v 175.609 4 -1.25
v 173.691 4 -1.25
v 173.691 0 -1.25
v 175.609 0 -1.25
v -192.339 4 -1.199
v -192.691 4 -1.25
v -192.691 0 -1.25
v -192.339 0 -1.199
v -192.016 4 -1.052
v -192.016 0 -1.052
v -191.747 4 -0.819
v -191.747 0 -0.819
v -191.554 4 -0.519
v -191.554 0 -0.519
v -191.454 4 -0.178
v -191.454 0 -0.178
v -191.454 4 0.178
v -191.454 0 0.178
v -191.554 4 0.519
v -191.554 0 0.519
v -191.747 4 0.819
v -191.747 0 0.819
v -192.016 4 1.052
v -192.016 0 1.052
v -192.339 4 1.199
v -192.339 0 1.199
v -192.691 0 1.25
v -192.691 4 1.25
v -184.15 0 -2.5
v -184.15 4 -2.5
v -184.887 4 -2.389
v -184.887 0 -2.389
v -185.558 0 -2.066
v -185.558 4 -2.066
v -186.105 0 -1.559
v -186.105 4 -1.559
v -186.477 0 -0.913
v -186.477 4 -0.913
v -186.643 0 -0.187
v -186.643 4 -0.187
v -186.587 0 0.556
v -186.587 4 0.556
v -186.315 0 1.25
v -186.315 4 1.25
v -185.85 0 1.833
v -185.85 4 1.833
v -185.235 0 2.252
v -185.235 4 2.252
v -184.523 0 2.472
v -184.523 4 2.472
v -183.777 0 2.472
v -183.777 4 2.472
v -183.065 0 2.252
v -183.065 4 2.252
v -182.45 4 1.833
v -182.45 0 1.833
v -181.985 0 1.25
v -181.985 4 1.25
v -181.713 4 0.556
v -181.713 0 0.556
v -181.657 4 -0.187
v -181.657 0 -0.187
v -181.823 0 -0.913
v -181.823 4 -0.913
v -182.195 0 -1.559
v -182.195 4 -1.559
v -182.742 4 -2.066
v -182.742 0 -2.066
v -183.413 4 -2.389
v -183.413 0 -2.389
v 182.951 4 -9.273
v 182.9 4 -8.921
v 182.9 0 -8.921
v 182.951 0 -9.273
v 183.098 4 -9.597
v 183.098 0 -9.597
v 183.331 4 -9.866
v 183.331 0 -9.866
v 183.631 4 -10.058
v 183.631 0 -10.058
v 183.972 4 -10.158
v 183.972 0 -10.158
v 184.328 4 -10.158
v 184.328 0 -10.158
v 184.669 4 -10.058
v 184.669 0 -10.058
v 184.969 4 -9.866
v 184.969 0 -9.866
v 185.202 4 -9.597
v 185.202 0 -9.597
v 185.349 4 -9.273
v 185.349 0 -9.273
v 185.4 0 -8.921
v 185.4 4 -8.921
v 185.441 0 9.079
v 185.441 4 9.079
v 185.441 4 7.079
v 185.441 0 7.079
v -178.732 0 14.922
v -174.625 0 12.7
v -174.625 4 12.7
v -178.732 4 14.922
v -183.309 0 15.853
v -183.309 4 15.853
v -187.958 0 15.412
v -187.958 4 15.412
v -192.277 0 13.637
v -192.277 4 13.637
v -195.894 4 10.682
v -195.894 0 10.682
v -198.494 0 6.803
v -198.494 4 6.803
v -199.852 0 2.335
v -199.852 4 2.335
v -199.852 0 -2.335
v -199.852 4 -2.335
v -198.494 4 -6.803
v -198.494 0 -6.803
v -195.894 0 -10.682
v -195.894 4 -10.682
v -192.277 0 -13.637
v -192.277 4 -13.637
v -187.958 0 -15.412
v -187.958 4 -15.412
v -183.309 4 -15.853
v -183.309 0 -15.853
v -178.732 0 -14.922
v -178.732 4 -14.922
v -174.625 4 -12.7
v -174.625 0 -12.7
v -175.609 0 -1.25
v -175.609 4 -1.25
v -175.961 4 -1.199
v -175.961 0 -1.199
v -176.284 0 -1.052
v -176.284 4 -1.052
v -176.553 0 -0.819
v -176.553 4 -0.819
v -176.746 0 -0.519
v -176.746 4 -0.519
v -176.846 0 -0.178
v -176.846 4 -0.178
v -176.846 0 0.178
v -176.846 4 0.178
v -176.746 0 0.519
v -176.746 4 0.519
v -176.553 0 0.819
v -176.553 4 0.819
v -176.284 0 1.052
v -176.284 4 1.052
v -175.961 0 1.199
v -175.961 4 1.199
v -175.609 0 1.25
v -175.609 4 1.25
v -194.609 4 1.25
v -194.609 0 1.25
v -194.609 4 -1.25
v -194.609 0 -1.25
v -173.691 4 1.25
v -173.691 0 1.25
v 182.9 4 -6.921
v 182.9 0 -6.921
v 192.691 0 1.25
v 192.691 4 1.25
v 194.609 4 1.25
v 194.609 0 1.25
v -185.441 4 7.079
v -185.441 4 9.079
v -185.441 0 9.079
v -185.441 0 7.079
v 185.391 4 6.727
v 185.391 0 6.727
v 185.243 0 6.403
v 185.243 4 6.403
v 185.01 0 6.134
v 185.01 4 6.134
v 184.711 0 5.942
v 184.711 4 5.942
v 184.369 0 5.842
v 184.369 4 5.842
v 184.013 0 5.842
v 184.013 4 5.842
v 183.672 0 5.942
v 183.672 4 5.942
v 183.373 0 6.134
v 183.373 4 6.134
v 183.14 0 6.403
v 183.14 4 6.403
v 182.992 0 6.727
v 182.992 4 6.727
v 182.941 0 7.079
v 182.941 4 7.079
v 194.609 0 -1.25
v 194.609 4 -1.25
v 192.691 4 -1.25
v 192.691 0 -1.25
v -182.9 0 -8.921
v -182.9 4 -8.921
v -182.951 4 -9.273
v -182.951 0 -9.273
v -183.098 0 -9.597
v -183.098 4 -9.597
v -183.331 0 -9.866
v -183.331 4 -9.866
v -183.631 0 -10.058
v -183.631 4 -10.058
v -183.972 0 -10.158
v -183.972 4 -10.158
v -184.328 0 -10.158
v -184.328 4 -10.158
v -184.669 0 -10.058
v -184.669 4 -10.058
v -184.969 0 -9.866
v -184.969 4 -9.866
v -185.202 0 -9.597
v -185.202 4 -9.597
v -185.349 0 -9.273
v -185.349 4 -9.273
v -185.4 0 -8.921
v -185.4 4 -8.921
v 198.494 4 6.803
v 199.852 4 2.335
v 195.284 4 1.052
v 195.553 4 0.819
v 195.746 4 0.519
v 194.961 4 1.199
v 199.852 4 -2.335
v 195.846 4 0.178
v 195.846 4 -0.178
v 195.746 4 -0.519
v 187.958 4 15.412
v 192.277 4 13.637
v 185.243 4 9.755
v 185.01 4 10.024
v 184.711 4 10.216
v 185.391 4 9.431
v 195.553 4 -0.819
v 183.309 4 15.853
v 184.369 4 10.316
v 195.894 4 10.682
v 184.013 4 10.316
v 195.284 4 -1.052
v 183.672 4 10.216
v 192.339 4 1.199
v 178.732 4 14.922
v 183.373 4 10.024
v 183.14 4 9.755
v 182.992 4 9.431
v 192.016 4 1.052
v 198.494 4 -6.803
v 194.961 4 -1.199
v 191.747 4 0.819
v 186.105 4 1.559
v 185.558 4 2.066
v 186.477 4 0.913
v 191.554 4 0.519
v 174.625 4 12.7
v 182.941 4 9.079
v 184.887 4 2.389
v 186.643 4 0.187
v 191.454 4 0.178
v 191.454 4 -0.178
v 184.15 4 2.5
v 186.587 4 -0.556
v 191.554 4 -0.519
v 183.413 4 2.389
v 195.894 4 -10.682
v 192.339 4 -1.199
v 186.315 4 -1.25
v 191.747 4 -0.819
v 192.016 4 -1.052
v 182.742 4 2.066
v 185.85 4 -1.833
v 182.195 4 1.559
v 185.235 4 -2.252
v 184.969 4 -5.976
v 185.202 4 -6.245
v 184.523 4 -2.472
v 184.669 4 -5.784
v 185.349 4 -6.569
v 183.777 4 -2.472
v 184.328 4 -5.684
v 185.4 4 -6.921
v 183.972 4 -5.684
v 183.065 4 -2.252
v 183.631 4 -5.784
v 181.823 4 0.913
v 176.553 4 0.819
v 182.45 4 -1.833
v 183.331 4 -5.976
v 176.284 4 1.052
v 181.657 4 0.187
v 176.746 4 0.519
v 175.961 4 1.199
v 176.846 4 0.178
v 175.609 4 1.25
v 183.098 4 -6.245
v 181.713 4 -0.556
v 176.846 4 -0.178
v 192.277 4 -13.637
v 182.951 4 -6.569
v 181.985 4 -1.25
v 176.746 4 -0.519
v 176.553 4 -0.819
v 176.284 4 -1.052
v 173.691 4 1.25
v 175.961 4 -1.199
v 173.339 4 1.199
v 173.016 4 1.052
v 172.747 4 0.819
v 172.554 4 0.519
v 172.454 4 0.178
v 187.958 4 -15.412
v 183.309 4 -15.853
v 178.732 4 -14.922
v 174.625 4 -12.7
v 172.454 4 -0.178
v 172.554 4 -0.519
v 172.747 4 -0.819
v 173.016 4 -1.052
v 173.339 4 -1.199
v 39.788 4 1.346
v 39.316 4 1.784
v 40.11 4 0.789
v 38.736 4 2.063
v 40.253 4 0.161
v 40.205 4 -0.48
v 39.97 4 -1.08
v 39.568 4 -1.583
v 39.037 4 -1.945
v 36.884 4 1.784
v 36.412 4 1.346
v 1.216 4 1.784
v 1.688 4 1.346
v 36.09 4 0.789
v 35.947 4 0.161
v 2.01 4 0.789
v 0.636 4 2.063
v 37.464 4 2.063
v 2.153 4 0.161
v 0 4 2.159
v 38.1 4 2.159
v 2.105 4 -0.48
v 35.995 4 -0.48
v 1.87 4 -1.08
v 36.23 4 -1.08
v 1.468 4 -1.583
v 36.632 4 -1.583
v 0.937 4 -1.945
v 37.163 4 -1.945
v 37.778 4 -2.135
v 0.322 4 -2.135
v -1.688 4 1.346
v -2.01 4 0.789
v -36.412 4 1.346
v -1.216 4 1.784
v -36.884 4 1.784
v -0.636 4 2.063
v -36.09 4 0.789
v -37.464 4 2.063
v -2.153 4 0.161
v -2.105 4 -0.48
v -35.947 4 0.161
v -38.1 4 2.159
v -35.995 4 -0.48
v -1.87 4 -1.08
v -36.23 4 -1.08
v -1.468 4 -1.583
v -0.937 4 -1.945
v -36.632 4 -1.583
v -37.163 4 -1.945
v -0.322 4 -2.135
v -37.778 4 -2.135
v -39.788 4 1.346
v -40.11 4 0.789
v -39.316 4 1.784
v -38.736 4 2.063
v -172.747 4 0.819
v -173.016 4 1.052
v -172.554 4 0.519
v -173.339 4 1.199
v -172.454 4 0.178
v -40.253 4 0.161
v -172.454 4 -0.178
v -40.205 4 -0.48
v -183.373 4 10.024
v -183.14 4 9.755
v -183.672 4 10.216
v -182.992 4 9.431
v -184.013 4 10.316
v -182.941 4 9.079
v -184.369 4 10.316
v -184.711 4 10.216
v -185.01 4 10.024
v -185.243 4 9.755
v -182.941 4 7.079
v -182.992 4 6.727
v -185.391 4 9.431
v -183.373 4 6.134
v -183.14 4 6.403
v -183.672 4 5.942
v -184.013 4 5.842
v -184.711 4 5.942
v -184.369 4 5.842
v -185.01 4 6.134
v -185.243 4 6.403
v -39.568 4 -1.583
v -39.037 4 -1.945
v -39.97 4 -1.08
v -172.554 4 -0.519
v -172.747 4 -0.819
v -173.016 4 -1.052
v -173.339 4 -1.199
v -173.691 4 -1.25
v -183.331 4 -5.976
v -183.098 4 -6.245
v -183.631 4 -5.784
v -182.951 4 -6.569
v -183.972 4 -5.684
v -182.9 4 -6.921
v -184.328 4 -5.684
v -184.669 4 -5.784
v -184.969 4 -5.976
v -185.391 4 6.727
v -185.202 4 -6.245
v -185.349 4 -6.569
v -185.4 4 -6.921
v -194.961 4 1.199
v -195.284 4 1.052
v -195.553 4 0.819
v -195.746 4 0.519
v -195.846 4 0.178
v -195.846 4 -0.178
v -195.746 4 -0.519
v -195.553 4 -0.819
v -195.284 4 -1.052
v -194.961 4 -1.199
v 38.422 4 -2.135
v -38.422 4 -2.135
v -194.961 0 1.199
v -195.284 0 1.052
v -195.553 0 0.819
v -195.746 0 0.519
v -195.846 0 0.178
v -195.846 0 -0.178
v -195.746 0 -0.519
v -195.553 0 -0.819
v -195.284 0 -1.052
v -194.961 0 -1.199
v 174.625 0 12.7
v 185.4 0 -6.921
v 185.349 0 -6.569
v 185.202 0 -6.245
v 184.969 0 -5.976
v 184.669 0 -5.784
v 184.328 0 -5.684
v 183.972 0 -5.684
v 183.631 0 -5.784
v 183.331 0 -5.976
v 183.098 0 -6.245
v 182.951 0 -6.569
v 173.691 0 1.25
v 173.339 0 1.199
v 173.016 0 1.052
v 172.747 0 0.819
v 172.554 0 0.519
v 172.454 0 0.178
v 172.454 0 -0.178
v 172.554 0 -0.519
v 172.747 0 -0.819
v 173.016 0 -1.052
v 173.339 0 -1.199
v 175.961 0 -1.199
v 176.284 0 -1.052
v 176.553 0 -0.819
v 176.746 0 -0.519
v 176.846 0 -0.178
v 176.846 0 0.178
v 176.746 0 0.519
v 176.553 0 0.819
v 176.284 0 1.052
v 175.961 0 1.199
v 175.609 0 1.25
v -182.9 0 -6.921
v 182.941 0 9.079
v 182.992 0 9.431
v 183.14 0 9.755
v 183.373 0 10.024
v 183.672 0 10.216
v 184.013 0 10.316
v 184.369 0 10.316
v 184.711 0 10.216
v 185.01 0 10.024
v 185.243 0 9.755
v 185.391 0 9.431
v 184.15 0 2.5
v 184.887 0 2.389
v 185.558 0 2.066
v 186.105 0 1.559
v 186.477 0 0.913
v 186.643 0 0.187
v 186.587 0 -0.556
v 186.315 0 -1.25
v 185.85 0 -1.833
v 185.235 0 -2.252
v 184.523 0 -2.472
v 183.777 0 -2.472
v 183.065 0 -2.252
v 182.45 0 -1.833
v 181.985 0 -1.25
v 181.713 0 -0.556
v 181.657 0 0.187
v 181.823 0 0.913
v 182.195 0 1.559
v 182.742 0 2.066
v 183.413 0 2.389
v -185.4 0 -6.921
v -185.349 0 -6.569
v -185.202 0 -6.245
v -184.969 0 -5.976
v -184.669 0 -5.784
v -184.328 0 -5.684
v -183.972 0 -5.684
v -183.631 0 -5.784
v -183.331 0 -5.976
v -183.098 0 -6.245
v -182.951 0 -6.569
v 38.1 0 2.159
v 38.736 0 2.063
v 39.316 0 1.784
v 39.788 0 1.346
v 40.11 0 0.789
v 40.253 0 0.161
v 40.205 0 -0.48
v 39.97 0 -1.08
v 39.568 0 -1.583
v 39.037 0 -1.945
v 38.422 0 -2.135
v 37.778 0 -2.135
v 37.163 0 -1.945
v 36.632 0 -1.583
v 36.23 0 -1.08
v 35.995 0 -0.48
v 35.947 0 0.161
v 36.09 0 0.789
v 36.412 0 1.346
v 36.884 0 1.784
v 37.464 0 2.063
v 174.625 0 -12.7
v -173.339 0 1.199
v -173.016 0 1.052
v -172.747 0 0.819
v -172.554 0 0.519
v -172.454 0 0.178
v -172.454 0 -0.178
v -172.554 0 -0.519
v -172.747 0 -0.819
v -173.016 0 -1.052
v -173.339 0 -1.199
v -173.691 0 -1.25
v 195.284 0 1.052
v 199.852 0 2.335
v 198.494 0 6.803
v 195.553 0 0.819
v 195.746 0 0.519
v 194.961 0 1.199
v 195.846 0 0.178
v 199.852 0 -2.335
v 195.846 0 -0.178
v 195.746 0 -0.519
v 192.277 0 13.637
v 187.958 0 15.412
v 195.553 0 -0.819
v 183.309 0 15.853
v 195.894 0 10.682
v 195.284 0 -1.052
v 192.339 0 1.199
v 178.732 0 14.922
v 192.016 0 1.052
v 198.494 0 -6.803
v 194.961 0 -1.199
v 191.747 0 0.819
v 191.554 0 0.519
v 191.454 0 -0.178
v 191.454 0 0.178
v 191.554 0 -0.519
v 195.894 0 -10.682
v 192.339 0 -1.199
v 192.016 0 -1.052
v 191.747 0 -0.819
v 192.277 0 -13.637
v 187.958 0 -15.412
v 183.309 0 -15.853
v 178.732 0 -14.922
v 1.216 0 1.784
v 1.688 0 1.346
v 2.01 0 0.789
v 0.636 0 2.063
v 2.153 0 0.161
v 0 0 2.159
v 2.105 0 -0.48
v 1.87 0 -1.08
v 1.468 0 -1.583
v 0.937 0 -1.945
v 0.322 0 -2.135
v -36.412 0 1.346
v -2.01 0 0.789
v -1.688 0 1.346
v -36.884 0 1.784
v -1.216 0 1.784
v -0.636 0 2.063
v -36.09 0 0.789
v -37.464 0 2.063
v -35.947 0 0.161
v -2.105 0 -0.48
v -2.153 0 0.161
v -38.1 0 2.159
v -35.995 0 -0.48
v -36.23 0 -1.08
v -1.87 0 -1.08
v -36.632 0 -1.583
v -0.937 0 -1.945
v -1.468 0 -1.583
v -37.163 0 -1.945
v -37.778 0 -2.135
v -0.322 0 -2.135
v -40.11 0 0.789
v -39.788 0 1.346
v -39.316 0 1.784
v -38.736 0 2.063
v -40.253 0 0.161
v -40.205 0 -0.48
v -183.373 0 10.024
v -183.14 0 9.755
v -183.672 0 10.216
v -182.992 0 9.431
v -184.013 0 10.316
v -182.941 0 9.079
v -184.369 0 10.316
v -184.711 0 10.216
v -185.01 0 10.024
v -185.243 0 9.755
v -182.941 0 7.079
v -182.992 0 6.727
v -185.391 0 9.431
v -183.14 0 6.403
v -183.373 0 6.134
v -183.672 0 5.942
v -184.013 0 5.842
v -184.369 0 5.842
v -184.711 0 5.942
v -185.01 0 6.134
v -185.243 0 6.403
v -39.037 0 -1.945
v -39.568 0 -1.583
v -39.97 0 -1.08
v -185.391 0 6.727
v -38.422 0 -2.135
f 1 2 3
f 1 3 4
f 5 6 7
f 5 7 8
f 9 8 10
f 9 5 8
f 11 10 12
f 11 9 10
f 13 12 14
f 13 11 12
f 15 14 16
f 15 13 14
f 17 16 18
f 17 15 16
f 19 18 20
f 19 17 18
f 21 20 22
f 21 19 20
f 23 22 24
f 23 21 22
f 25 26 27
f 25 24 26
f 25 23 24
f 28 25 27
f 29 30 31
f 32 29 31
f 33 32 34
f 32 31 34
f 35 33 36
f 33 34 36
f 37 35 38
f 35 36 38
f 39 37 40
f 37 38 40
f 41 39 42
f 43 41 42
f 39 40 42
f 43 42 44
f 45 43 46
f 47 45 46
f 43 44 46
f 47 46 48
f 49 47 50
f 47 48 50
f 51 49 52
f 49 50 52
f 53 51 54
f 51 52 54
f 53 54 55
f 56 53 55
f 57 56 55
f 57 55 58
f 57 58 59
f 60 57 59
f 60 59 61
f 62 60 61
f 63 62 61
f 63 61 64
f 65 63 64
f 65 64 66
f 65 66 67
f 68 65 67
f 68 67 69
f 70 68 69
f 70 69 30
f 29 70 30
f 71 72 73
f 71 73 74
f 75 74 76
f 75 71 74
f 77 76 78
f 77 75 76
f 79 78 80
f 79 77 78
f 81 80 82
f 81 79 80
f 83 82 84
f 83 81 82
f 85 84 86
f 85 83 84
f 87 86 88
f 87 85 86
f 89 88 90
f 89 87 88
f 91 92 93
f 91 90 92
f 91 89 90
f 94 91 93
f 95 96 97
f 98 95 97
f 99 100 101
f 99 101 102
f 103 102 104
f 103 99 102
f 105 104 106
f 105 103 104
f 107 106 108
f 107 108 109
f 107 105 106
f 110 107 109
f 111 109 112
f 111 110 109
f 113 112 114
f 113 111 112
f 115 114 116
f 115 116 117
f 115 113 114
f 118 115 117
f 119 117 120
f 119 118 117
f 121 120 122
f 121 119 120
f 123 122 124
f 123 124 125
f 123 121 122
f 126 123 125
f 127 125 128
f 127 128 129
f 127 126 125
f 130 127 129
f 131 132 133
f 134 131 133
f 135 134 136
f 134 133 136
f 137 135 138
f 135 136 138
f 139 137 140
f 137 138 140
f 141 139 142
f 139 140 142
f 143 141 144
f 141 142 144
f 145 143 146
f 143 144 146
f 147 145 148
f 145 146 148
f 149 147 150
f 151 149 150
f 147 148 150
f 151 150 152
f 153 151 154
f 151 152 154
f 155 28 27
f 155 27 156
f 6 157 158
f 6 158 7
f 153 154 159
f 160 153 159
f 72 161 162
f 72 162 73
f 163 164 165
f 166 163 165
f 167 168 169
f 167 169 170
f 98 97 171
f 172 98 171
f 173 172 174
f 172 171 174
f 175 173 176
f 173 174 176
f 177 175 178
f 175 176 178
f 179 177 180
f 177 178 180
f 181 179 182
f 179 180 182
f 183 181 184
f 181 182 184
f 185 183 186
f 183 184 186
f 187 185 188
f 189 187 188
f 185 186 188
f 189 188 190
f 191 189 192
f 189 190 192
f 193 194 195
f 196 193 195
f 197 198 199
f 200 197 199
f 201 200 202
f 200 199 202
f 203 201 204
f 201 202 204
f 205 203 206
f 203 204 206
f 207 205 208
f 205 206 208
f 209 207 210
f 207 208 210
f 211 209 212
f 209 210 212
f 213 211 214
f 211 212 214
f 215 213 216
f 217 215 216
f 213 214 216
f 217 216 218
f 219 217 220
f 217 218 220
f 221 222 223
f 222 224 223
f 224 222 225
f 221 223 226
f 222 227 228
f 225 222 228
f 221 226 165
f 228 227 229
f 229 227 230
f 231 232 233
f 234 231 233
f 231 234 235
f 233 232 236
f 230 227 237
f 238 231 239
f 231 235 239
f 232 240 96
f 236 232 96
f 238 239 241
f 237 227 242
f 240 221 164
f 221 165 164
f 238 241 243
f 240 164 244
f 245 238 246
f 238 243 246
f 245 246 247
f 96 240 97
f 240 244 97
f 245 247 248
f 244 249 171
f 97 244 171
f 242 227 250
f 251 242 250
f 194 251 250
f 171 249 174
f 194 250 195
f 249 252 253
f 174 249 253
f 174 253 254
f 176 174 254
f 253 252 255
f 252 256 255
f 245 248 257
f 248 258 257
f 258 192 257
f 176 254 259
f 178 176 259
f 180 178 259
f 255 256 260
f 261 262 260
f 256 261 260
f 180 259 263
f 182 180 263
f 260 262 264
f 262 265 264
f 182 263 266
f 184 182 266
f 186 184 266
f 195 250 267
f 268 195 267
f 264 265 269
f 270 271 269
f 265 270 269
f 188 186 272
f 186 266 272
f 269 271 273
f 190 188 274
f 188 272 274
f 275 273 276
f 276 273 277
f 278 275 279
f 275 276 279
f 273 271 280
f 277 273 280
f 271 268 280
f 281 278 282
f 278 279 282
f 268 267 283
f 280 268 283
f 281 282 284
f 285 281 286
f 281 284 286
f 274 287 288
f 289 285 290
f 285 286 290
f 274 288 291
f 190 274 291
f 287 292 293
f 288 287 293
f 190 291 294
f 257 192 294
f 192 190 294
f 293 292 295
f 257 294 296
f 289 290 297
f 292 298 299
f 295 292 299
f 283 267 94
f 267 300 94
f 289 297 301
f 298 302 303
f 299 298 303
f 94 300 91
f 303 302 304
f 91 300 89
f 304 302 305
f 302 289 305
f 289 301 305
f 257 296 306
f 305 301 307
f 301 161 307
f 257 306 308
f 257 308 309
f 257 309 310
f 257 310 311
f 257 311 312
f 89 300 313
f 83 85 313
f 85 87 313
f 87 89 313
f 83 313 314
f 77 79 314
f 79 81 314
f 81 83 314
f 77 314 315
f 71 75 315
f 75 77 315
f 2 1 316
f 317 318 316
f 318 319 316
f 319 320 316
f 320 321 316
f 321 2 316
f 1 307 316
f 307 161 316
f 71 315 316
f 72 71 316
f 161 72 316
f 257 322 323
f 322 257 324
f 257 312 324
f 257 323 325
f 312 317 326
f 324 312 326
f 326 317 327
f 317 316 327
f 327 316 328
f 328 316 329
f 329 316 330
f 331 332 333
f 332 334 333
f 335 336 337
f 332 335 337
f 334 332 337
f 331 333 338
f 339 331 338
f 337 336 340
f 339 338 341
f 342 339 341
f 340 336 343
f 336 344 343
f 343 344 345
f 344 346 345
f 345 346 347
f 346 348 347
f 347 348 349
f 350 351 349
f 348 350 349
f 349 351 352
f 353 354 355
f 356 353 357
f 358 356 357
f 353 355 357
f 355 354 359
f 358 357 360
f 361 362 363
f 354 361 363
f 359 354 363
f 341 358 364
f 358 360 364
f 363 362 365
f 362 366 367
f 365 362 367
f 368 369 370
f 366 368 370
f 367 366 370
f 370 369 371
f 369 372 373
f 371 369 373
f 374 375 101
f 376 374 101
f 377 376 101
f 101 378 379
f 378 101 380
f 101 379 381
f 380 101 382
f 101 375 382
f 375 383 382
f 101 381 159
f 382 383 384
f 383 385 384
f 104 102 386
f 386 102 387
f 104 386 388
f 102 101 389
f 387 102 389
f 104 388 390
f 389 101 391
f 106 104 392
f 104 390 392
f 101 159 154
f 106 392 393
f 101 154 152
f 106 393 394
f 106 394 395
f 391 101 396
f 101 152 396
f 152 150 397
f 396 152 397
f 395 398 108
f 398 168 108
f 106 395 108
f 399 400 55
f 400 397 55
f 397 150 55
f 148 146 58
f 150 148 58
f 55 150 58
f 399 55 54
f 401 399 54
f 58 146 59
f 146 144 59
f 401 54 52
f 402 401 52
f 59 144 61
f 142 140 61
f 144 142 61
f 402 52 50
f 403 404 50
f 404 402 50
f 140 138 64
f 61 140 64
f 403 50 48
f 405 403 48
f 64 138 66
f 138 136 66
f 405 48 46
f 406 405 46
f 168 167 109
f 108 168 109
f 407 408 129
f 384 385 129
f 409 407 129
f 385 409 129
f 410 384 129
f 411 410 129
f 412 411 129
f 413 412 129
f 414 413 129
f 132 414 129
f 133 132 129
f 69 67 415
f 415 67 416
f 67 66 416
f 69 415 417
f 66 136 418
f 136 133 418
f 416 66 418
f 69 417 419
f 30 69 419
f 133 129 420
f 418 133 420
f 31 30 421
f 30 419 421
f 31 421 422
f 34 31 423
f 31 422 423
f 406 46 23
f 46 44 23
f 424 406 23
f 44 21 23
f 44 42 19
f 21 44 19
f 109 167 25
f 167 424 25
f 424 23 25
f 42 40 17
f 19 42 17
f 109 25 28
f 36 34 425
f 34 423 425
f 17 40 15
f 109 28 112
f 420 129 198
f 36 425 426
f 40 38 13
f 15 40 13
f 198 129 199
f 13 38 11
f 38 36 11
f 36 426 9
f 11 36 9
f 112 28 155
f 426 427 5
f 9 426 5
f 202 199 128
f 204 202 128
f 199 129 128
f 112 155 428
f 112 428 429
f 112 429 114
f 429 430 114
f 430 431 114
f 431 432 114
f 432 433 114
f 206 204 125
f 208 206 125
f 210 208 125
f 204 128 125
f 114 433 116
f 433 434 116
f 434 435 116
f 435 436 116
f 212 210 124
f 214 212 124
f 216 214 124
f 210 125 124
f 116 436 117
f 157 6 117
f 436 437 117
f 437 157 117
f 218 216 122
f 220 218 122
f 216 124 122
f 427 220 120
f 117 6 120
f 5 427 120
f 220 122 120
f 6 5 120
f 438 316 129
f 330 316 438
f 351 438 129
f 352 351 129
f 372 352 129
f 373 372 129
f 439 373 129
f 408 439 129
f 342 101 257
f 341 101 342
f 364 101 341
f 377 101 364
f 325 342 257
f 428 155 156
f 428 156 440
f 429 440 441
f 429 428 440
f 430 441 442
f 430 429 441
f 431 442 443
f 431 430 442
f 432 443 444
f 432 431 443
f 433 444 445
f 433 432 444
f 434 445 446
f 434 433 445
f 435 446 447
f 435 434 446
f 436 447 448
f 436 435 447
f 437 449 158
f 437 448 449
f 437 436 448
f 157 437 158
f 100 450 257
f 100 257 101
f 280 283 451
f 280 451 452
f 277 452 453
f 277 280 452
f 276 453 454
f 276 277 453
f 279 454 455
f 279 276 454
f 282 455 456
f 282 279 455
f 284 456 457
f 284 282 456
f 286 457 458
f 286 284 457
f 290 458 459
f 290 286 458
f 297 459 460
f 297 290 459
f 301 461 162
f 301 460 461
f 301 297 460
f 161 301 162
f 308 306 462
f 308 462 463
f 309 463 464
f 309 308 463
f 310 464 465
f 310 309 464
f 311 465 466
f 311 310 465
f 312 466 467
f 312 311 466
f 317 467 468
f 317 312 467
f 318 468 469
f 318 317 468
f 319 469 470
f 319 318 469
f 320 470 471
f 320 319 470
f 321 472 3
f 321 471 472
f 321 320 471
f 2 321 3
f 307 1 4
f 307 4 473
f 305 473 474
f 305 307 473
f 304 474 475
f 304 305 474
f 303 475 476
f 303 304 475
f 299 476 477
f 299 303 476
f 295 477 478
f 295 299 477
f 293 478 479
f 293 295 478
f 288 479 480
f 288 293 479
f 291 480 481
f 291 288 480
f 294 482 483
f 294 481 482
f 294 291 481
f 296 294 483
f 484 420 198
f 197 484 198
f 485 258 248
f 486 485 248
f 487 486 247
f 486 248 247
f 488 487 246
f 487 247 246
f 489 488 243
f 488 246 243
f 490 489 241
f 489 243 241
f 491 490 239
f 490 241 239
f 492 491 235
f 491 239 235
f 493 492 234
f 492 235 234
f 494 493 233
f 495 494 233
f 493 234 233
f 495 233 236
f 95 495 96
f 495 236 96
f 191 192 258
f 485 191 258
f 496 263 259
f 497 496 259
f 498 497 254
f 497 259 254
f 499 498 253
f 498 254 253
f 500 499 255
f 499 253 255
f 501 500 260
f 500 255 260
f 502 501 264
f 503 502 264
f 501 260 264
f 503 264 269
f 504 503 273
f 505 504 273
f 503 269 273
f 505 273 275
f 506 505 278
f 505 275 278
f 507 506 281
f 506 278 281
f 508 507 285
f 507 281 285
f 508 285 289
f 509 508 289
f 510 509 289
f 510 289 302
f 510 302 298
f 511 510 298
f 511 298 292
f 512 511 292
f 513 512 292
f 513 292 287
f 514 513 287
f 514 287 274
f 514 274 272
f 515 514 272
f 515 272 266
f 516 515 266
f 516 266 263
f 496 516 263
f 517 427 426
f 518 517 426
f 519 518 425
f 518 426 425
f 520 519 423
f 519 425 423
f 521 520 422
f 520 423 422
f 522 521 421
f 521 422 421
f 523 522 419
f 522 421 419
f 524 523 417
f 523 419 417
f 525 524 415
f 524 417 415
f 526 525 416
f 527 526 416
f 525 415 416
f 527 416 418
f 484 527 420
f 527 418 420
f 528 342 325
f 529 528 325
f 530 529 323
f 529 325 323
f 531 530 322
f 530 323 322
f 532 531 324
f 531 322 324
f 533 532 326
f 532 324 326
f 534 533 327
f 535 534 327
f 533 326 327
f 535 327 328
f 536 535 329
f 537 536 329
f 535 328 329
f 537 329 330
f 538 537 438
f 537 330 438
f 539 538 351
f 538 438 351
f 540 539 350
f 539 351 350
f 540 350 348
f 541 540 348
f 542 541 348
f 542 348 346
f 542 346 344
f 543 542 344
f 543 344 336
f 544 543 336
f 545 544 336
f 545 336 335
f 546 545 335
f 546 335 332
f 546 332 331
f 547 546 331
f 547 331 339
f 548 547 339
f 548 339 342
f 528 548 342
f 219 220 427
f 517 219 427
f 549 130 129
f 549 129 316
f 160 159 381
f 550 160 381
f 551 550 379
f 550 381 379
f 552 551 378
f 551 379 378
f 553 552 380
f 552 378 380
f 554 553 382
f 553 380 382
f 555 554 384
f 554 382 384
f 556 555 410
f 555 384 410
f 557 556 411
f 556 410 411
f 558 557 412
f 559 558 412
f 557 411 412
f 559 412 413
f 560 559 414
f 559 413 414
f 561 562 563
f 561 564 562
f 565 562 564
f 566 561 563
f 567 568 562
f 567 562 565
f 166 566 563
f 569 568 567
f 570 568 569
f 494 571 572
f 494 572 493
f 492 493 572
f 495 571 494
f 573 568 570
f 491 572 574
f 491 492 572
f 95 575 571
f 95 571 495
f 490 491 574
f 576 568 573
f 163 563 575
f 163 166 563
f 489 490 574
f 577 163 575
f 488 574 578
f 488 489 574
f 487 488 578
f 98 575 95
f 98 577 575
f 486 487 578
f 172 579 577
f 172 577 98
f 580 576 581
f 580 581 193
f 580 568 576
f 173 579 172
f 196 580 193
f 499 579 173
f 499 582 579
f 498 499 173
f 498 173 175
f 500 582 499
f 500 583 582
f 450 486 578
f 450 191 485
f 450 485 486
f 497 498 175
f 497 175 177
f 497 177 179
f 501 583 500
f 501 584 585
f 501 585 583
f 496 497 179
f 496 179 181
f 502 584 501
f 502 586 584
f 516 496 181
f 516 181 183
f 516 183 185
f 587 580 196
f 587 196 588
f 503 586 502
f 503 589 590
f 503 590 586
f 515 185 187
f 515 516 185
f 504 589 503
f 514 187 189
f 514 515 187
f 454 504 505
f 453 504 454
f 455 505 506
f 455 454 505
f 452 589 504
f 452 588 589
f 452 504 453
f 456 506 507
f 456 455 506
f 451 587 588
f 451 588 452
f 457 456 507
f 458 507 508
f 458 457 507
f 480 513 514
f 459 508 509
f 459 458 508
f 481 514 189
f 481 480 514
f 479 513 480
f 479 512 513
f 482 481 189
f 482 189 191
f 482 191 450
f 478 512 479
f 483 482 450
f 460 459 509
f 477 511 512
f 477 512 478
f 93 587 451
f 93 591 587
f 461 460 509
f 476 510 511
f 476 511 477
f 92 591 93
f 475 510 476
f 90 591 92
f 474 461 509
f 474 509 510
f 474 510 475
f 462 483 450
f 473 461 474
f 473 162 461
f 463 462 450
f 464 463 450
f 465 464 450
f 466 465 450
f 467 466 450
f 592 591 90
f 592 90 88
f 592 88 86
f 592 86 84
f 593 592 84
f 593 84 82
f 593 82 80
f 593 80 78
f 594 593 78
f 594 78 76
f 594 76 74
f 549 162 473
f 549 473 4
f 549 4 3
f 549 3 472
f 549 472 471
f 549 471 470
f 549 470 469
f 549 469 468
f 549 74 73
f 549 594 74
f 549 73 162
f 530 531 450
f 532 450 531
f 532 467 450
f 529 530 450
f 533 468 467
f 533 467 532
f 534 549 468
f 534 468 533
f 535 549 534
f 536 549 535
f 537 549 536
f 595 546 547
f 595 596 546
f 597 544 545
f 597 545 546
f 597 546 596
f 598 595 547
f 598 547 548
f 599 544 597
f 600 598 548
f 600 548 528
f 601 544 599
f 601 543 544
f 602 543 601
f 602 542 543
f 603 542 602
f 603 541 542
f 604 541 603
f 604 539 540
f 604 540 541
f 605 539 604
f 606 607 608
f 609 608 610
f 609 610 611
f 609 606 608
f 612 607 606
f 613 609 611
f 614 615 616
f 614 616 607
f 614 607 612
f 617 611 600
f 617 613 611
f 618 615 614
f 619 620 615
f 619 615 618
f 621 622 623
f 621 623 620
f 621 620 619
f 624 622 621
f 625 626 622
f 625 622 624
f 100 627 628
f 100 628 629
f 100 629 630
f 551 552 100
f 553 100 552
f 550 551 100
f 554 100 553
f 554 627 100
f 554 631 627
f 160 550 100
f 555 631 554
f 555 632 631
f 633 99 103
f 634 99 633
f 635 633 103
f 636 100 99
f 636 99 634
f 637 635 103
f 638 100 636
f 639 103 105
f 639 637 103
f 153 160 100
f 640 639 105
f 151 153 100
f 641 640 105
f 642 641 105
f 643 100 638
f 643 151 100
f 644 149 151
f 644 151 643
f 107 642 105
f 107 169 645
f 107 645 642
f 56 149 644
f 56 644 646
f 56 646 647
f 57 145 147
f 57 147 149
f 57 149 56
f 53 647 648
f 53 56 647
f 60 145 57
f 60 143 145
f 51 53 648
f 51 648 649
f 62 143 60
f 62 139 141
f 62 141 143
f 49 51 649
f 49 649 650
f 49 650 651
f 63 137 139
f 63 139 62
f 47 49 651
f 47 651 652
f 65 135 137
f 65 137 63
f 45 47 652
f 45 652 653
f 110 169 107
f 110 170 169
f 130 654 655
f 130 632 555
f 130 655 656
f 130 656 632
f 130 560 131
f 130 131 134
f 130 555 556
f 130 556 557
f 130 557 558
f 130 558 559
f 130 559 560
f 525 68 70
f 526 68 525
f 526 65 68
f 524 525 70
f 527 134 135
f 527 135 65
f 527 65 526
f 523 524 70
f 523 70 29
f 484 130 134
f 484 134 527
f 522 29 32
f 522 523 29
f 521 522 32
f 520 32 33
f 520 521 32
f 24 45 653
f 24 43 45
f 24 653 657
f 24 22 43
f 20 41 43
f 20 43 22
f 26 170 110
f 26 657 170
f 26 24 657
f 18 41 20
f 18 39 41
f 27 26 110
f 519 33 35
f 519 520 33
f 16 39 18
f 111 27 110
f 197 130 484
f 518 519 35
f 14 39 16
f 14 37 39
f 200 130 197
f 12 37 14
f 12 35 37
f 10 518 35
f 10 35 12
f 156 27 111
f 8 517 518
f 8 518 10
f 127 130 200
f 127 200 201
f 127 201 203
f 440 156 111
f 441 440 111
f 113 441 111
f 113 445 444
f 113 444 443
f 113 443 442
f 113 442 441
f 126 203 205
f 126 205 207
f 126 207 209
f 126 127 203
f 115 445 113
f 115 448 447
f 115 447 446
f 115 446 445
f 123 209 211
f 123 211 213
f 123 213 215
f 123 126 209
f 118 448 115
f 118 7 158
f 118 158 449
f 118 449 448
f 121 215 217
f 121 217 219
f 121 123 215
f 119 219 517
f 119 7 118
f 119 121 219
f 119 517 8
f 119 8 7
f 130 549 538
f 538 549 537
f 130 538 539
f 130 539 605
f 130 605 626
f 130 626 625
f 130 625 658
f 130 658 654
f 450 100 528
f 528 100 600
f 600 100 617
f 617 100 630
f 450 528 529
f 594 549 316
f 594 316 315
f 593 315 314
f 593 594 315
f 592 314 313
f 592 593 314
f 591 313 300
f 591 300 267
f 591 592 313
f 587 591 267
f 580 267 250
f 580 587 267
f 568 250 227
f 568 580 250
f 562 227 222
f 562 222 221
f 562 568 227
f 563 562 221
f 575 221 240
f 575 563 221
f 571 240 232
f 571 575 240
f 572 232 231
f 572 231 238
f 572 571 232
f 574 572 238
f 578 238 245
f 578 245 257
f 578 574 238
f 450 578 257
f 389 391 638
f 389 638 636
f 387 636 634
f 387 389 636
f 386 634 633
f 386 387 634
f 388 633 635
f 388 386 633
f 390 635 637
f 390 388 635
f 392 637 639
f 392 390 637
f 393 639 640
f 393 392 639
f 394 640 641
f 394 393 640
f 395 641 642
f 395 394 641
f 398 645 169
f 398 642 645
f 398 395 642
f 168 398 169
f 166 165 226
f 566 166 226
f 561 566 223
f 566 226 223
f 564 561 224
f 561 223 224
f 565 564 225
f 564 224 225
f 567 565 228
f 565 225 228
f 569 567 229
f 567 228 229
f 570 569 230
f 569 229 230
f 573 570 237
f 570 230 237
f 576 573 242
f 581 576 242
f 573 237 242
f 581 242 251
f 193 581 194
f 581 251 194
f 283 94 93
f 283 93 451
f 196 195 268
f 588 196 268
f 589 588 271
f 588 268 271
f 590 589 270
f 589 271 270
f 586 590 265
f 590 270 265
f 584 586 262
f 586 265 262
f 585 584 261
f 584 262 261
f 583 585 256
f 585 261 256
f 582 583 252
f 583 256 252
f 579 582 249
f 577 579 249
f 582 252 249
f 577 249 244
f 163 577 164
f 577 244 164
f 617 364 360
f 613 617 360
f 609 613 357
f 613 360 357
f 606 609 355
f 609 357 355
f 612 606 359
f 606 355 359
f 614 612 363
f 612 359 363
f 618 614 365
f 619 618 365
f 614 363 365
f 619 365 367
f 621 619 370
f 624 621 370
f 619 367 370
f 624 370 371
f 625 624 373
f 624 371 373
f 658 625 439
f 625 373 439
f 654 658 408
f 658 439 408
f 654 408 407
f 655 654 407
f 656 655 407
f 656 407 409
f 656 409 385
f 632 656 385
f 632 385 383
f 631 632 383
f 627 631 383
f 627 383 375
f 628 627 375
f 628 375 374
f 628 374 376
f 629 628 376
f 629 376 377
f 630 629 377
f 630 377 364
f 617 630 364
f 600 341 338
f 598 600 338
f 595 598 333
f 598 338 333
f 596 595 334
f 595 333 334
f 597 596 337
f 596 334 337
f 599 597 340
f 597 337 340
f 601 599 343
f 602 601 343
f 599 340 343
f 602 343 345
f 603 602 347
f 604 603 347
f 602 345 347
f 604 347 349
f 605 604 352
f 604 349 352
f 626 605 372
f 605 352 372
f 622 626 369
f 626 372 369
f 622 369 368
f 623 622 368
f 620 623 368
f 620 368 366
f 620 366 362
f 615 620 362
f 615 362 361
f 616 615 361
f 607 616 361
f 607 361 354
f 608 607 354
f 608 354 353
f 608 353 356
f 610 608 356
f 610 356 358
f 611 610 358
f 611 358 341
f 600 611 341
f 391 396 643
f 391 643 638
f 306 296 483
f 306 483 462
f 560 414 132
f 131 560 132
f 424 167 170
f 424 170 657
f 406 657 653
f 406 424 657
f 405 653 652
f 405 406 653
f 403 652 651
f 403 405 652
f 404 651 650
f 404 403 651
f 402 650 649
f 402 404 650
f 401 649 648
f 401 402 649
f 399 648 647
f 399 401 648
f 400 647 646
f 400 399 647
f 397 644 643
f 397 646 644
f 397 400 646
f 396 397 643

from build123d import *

# Parameters (mm, degrees)
BOSS_EXTRUDE1_DEPTH = 4
SKETCH2_R           = 2.5
CUT_EXTRUDE1_DEPTH  = 201.6938371
SKETCH3_R           = 2.159
CUT_EXTRUDE2_DEPTH  = 201.6938371


with BuildPart() as part:
    # Sketch1 → Boss-Extrude1 (new body)
    with BuildSketch(Plane(origin=(0, 0, 0), x_dir=(1, 0, 0), z_dir=(0, 1, 0))):
        with BuildLine():
            Line((-174.625, 12.7), (174.625, 12.7))
            ThreePointArc((174.625, 12.7), (200.025, 0), (174.625, -12.7))
            Line((174.625, -12.7), (-174.625, -12.7))
            ThreePointArc((-174.625, -12.7), (-200.025, 0), (-174.625, 12.7))
        make_face()
    extrude(amount=BOSS_EXTRUDE1_DEPTH)

    # Sketch2 → Cut-Extrude1 (cut, through all)
    with BuildSketch(Plane(origin=(0, 4, 0), x_dir=(1, 0, 0), z_dir=(0, 1, 0))):
        with Locations(Location((184.15, 0, 0), (0, 0, 270))):
            Circle(SKETCH2_R)
        with Locations(Location((-184.15, 0, 0), (0, 0, 90))):
            Circle(SKETCH2_R)
        with BuildLine():
            Line((173.691383345, 1.25), (175.608616655, 1.25))
            ThreePointArc((175.608616655, 1.25), (176.858616655, 0), (175.608616655, -1.25))
            Line((175.608616655, -1.25), (173.691383345, -1.25))
            ThreePointArc((173.691383345, -1.25), (172.441383345, 0), (173.691383345, 1.25))
        make_face()
        with BuildLine():
            Line((194.608616655, 1.25), (192.691383345, 1.25))
            ThreePointArc((192.691383345, 1.25), (191.441383345, 0), (192.691383345, -1.25))
            Line((192.691383345, -1.25), (194.608616655, -1.25))
            ThreePointArc((194.608616655, -1.25), (195.858616655, 0), (194.608616655, 1.25))
        make_face()
        with BuildLine():
            Line((185.4, 8.920928665), (185.4, 6.921035691))
            ThreePointArc((185.4, 6.921035691), (184.15, 5.671035691), (182.9, 6.921035691))
            Line((182.9, 6.921035691), (182.9, 8.920928665))
            ThreePointArc((182.9, 8.920928665), (184.15, 10.170928665), (185.4, 8.920928665))
        make_face()
        with BuildLine():
            Line((185.441381345, -9.078964309), (185.441381345, -7.078964309))
            ThreePointArc((185.441381345, -7.078964309), (184.191381345, -5.828964309), (182.941381345, -7.078964309))
            Line((182.941381345, -7.078964309), (182.941381345, -9.078964309))
            ThreePointArc((182.941381345, -9.078964309), (184.191381345, -10.328964309), (185.441381345, -9.078964309))
        make_face()
        with BuildLine():
            Line((-185.441381345, -9.078964309), (-185.441381345, -7.078964309))
            ThreePointArc((-185.441381345, -7.078964309), (-184.191381345, -5.828964309), (-182.941381345, -7.078964309))
            Line((-182.941381345, -7.078964309), (-182.941381345, -9.078964309))
            ThreePointArc((-182.941381345, -9.078964309), (-184.191381345, -10.328964309), (-185.441381345, -9.078964309))
        make_face()
        with BuildLine():
            Line((-185.4, 8.920928665), (-185.4, 6.921035691))
            ThreePointArc((-185.4, 6.921035691), (-184.15, 5.671035691), (-182.9, 6.921035691))
            Line((-182.9, 6.921035691), (-182.9, 8.920928665))
            ThreePointArc((-182.9, 8.920928665), (-184.15, 10.170928665), (-185.4, 8.920928665))
        make_face()
        with BuildLine():
            Line((-194.608616655, 1.25), (-192.691383345, 1.25))
            ThreePointArc((-192.691383345, 1.25), (-191.441383345, 0), (-192.691383345, -1.25))
            Line((-192.691383345, -1.25), (-194.608616655, -1.25))
            ThreePointArc((-194.608616655, -1.25), (-195.858616655, 0), (-194.608616655, 1.25))
        make_face()
        with BuildLine():
            Line((-173.691383345, 1.25), (-175.608616655, 1.25))
            ThreePointArc((-175.608616655, 1.25), (-176.858616655, 0), (-175.608616655, -1.25))
            Line((-175.608616655, -1.25), (-173.691383345, -1.25))
            ThreePointArc((-173.691383345, -1.25), (-172.441383345, 0), (-173.691383345, 1.25))
        make_face()
    extrude(amount=-CUT_EXTRUDE1_DEPTH, mode=Mode.SUBTRACT)

    # Sketch3 → Cut-Extrude2 (cut, through all)
    with BuildSketch(Plane(origin=(0, 4, 0), x_dir=(1, 0, 0), z_dir=(0, 1, 0))):
        with Locations(Location((0, 0, 0), (0, 0, 270))):
            Circle(SKETCH3_R)
        with Locations(Location((38.1, 0, 0), (0, 0, 270))):
            Circle(SKETCH3_R)
        with Locations(Location((-38.1, 0, 0), (0, 0, 270))):
            Circle(SKETCH3_R)
    extrude(amount=-CUT_EXTRUDE2_DEPTH, mode=Mode.SUBTRACT)


solid = part.part
